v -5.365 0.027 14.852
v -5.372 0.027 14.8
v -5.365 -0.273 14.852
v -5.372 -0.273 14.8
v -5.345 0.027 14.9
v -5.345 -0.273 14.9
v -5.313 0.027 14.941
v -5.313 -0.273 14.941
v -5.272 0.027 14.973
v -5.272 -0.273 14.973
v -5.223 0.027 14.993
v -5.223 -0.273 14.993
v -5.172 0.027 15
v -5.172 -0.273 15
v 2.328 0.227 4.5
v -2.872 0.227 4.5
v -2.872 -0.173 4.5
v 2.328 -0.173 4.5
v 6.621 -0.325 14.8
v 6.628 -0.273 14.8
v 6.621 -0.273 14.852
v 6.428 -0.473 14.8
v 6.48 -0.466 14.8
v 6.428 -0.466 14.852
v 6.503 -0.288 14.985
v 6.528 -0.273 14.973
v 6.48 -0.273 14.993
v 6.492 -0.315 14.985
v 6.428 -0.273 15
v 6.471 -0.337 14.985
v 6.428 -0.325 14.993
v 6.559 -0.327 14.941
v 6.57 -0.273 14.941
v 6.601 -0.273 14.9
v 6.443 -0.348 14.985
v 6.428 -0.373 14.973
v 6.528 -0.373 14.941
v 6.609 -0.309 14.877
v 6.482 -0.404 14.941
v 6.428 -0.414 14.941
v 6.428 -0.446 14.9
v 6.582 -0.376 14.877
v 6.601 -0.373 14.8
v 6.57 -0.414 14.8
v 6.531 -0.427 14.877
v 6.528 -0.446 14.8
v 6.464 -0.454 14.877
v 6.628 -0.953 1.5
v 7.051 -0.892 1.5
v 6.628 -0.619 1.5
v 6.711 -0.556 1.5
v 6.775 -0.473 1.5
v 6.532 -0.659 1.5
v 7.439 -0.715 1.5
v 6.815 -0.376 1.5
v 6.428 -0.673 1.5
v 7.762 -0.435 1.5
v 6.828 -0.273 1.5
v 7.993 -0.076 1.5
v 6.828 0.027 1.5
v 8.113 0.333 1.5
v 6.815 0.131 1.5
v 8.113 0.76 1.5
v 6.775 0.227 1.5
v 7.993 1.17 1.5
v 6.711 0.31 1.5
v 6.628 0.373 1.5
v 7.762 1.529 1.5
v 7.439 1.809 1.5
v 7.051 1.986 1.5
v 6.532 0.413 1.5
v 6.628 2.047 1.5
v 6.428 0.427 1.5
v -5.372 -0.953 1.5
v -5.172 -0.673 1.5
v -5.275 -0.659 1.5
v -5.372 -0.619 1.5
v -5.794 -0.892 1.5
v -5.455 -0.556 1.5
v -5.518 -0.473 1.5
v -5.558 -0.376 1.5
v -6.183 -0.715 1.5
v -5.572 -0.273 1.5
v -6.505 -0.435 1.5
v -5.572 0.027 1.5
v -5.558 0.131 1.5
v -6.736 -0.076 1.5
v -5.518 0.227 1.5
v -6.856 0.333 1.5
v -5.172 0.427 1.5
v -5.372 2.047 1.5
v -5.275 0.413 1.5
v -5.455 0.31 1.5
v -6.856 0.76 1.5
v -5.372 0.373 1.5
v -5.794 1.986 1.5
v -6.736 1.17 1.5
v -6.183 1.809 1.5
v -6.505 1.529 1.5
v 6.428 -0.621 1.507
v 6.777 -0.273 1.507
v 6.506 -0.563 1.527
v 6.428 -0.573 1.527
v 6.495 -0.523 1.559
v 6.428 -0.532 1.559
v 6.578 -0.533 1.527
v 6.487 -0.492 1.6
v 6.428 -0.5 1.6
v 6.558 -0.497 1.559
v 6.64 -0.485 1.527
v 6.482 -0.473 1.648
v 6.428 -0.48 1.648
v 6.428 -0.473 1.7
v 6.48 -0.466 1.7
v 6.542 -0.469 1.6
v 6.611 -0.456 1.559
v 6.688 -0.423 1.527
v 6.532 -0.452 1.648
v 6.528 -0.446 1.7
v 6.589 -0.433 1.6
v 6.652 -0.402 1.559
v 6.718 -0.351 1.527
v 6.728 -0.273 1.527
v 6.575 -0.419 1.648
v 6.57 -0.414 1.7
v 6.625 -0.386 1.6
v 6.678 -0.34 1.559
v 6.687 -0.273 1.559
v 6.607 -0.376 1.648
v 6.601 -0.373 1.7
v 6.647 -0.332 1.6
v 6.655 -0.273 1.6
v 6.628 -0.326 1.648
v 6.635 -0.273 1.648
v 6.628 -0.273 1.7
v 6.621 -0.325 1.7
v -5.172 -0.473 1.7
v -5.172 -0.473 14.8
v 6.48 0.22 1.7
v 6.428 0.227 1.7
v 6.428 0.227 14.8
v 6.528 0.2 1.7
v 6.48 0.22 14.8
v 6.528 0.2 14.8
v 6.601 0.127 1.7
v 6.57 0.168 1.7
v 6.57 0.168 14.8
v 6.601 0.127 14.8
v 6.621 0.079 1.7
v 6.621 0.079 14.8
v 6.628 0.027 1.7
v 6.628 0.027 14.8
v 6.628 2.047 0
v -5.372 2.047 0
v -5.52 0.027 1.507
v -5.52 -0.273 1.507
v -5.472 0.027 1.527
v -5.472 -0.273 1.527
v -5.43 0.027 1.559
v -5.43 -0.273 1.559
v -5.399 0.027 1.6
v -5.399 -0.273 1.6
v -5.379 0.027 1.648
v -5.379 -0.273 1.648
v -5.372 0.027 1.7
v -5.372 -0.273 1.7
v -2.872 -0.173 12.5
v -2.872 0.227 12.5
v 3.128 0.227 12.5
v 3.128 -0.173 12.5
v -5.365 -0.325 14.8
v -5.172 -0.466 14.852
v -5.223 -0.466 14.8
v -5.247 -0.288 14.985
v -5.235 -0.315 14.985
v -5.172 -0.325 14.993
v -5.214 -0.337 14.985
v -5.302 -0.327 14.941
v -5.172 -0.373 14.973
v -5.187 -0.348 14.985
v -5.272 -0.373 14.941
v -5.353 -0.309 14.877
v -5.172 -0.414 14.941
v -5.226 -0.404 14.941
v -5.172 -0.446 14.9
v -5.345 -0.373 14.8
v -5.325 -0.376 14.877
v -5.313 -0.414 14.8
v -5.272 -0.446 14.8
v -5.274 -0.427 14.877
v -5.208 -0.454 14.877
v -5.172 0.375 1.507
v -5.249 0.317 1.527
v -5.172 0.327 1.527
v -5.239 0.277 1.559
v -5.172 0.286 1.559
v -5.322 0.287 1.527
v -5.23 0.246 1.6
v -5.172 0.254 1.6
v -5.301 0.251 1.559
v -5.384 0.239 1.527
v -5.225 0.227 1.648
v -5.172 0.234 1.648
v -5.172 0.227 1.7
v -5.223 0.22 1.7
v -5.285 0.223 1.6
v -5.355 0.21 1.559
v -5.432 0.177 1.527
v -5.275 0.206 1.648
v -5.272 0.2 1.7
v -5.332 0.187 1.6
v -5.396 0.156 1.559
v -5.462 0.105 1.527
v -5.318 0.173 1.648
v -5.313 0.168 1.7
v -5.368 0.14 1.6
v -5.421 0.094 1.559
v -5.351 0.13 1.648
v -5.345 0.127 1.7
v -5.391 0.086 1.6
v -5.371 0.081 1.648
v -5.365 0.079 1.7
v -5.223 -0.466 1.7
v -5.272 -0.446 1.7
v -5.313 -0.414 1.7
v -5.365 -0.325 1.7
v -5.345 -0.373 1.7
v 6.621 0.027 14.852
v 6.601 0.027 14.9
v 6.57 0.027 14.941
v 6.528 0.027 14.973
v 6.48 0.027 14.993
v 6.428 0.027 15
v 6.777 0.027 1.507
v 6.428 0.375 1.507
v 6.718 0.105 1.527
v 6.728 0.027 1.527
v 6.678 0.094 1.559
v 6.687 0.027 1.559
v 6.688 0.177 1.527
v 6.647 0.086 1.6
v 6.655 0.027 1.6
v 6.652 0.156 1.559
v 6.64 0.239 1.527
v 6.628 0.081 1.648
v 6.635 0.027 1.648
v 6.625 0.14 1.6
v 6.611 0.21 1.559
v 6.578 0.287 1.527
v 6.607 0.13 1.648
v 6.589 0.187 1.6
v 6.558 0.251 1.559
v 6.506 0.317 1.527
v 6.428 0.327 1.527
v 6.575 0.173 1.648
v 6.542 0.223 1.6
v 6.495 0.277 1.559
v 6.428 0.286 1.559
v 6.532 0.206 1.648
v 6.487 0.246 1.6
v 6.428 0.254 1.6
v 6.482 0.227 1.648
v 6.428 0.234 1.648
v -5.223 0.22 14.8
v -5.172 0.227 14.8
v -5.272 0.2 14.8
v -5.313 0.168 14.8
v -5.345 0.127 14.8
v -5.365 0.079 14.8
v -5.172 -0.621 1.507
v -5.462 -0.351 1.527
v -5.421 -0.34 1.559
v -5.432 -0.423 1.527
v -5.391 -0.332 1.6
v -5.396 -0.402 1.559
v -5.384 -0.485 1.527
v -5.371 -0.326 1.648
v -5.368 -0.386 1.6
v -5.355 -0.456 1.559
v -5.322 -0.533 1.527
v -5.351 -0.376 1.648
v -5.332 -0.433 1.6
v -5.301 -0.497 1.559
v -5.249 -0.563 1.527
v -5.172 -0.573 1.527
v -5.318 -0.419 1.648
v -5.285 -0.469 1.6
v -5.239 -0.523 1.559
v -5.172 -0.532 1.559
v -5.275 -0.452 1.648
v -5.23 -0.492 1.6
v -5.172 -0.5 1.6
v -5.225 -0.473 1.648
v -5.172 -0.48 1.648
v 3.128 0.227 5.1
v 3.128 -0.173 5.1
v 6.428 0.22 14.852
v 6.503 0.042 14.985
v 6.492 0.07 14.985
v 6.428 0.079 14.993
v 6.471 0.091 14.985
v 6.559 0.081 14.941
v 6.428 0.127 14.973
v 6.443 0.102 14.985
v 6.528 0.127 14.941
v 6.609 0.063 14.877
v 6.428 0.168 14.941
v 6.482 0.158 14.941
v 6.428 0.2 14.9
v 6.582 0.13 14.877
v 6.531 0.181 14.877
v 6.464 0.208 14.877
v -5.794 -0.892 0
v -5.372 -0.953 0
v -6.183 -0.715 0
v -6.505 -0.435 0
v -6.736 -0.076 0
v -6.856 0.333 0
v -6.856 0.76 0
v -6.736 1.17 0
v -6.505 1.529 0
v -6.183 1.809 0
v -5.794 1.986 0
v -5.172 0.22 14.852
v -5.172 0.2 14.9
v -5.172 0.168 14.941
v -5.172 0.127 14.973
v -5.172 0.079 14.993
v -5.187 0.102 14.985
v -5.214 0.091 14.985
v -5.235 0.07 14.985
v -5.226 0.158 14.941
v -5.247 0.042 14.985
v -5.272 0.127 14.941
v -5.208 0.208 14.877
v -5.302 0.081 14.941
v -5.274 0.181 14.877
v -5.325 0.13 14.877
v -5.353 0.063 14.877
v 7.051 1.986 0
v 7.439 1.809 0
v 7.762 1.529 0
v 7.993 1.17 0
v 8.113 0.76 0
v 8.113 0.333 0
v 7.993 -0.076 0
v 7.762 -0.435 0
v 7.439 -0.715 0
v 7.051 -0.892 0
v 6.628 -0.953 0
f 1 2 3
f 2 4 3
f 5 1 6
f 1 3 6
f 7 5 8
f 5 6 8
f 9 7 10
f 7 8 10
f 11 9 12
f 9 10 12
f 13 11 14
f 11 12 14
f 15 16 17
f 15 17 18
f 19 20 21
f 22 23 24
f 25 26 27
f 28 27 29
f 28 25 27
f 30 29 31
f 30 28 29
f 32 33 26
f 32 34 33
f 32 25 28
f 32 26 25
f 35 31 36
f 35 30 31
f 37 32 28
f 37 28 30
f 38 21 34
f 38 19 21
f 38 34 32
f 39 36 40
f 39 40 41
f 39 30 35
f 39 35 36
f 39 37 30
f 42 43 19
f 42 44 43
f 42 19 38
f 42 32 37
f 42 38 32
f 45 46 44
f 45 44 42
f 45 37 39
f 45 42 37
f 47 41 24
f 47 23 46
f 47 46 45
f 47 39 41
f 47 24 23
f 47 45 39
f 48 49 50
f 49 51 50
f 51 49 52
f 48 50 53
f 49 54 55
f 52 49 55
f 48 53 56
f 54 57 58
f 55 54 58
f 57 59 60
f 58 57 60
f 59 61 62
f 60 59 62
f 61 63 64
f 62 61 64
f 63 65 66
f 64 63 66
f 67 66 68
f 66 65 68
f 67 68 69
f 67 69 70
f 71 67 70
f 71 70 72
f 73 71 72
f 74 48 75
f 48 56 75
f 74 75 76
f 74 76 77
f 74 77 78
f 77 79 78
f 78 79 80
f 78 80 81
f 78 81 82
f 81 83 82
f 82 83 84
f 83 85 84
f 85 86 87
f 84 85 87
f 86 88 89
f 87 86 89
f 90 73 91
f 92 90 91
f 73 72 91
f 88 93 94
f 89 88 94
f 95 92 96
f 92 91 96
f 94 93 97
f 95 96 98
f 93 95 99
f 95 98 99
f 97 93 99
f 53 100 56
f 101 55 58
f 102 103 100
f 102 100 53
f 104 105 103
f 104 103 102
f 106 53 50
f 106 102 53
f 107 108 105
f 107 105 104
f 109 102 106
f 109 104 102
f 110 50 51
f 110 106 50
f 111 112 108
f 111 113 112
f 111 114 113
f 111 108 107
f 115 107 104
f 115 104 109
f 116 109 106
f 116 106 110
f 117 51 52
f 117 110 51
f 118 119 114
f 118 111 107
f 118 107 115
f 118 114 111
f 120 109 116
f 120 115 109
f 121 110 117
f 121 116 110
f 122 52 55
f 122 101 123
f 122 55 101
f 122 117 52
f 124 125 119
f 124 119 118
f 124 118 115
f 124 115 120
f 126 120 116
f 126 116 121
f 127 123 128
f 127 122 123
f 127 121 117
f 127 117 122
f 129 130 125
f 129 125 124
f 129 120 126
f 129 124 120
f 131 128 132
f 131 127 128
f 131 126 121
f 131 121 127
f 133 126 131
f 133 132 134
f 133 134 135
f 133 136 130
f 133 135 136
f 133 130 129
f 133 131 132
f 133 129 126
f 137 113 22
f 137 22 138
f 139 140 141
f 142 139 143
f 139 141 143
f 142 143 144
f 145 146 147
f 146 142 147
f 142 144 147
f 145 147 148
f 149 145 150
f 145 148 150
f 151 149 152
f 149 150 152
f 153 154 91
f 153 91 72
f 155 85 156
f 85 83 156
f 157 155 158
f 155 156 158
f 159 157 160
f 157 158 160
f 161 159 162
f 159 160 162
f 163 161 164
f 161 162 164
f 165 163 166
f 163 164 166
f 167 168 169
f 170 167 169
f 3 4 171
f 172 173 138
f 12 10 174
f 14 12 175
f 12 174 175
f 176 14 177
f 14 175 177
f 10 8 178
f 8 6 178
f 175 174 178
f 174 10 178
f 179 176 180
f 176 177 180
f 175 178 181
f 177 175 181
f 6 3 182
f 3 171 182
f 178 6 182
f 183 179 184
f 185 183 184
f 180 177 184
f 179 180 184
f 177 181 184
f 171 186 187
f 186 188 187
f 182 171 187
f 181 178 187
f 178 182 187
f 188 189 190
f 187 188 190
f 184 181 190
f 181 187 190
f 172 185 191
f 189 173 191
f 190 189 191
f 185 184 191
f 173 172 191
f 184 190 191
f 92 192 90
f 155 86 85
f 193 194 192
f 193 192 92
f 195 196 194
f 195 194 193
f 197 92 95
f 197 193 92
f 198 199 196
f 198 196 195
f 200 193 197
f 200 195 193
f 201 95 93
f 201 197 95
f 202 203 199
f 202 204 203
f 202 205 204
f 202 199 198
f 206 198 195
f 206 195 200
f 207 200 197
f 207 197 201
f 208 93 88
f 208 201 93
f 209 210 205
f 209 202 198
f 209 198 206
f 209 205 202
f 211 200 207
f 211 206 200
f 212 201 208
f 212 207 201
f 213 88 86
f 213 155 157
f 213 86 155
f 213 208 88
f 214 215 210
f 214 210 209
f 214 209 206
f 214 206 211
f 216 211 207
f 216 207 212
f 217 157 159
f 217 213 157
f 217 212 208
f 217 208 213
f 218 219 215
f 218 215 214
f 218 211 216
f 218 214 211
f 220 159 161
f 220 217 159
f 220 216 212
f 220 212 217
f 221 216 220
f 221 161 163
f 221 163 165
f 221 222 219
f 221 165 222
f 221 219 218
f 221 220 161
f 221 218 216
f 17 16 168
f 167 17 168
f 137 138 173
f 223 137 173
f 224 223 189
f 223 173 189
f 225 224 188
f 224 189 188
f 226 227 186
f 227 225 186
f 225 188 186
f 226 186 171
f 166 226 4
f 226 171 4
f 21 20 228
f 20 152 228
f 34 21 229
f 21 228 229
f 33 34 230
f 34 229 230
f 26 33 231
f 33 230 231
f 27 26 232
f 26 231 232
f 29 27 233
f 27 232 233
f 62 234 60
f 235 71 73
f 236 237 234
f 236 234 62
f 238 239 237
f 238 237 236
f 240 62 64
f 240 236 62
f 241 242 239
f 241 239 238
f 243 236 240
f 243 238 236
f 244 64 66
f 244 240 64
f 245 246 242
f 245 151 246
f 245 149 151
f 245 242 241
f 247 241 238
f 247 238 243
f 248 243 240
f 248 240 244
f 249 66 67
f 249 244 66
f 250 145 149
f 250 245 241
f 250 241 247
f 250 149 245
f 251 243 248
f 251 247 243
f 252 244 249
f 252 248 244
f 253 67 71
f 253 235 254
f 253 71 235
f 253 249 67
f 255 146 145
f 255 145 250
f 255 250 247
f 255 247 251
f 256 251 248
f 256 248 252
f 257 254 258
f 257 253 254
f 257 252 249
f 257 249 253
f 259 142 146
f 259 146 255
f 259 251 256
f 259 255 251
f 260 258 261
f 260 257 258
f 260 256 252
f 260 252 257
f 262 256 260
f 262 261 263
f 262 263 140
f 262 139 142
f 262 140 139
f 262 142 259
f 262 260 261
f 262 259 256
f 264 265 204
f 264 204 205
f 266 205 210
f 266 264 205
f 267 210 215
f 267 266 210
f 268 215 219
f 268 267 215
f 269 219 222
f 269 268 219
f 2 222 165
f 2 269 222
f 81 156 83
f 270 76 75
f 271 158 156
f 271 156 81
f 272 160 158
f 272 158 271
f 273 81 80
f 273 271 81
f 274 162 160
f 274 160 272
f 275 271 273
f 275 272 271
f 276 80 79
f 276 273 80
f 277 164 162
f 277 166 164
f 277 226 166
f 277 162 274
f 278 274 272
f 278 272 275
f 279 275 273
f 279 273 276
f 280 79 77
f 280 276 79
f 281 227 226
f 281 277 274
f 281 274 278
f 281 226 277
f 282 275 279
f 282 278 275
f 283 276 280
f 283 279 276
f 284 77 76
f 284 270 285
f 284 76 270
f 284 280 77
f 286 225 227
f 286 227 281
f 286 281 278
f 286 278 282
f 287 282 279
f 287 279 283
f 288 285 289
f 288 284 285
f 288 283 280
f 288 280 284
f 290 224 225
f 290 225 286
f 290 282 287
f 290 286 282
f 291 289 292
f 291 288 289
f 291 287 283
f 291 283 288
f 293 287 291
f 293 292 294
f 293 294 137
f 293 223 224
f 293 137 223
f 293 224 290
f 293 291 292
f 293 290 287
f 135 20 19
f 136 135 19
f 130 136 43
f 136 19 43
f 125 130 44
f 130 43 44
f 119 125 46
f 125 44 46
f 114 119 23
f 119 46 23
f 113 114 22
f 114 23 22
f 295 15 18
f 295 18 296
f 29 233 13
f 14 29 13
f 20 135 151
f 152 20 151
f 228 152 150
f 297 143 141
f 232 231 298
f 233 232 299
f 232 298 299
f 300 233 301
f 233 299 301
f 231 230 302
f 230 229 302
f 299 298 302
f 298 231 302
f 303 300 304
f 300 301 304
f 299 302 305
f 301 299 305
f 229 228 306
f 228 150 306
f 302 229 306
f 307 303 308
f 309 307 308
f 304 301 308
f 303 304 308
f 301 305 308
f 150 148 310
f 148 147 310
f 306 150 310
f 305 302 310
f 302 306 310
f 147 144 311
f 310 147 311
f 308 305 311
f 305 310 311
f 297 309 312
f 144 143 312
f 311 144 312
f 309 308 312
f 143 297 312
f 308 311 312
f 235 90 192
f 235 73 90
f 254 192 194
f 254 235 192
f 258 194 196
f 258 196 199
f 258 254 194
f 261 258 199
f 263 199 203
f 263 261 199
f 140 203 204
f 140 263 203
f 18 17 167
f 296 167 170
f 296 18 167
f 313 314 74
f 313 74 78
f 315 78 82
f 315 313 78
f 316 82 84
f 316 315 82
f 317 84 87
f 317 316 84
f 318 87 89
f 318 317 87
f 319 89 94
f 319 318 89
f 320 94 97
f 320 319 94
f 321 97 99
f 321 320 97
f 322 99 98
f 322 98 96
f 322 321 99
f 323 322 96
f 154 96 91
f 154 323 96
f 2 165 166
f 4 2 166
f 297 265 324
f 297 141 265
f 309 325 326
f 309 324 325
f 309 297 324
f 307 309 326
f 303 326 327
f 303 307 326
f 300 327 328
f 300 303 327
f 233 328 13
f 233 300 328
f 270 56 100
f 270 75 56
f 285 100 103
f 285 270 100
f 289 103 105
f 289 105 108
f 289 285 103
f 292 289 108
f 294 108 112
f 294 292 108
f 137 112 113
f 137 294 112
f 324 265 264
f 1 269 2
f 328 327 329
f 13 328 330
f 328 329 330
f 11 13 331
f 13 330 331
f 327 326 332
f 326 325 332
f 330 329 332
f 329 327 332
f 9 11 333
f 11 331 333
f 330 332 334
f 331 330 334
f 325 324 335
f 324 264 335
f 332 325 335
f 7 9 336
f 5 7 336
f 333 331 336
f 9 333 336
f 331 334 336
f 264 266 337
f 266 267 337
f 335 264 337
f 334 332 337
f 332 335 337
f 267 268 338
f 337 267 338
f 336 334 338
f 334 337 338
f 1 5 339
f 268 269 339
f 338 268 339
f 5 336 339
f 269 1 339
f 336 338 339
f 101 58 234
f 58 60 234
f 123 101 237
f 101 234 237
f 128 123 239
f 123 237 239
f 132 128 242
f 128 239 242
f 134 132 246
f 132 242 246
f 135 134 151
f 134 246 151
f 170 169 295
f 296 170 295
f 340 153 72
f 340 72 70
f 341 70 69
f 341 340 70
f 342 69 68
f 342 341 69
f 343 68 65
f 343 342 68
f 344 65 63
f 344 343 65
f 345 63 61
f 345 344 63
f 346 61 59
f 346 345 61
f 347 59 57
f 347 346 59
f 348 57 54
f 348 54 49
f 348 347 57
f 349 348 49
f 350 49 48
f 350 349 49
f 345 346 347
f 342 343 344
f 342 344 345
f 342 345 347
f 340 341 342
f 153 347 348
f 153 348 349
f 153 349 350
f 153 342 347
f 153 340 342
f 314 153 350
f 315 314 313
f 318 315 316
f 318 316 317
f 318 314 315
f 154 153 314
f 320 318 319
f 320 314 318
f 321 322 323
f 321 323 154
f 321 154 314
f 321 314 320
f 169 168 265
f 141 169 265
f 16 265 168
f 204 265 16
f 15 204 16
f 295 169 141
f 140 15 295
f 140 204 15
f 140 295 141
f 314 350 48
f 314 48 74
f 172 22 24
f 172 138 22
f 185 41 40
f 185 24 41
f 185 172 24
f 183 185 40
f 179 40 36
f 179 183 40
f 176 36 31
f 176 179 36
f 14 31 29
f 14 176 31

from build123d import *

# Parameters (mm, degrees)
EXTRUDE_3_DEPTH     = 1.5
EXTRUDE_4_DEPTH     = 13.5
CUT_EXTRUDE_2_DEPTH = 0.4
FILLET_2_R          = 0.2
CUT_EXTRUDE_3_DEPTH = 0.4


with BuildPart() as part:
    # 草图1 → 凸台-拉伸3 (new body)
    with BuildSketch(Plane.XY):
        with BuildLine():
            Line((-5.371727749, 2.046879183), (6.628272251, 2.046879183))
            ThreePointArc((6.628272251, 2.046879183), (8.128272251, 0.546879183), (6.628272251, -0.953120817))
            Line((6.628272251, -0.953120817), (-5.371727749, -0.953120817))
            ThreePointArc((-5.371727749, -0.953120817), (-6.871727749, 0.546879183), (-5.371727749, 2.046879183))
        make_face()
    extrude(amount=EXTRUDE_3_DEPTH)

    # 草图2 → 凸台-拉伸4 (add)
    with BuildSketch(Plane.XY.offset(1.5)):
        Polygon((-5.371727749, -0.07294571), (-5.371727749, 0.22705429), (6.628272251, 0.22705429), (6.628272251, -0.07294571), (6.628272251, -0.47294571), (-5.371727749, -0.47294571), align=None)
    extrude(amount=EXTRUDE_4_DEPTH)

    # 草图3 → 切除-拉伸2 (cut)
    with BuildSketch(Plane(origin=(0, 0.22705429, 0), x_dir=(1, 0, 0), z_dir=(0, 1, 0))):
        Polygon((-2.871727749, -4.5), (-2.871727749, -12.5), (3.128272251, -12.5), (3.128272251, -5.1), (1.784565104, -4.5), align=None)
    extrude(amount=-CUT_EXTRUDE_2_DEPTH, mode=Mode.SUBTRACT)

    # 圆角2
    fillet_2_edges = [part.edges().sort_by_distance(p)[0] for p in [
        (0.628272251, 0.22705429, 1.5),
        (6.628272251, 0.22705429, 8.25),
        (-5.371727749, -0.12294571, 1.5),
        (-5.371727749, 0.22705429, 8.25),
        (0.628272251, -0.47294571, 1.5),
        (-5.371727749, -0.47294571, 8.25),
        (6.628272251, -0.12294571, 1.5),
        (6.628272251, -0.47294571, 8.25),
        (6.628272251, -0.12294571, 15),
        (0.628272251, 0.22705429, 15),
        (-5.371727749, -0.12294571, 15),
        (0.628272251, -0.47294571, 15),
    ]]
    fillet(fillet_2_edges, radius=FILLET_2_R)

    # 草图4 → 切除-拉伸3 (cut)
    with BuildSketch(Plane(origin=(0, 0.22705429, 0), x_dir=(1, 0, 0), z_dir=(0, 1, 0))):
        Polygon((-2.871727749, -12.5), (-2.871727749, -4.5), (2.328272251, -4.5), (3.128272251, -5.1), (3.128272251, -12.5), align=None)
    extrude(amount=-CUT_EXTRUDE_3_DEPTH, mode=Mode.SUBTRACT)


solid = part.part
